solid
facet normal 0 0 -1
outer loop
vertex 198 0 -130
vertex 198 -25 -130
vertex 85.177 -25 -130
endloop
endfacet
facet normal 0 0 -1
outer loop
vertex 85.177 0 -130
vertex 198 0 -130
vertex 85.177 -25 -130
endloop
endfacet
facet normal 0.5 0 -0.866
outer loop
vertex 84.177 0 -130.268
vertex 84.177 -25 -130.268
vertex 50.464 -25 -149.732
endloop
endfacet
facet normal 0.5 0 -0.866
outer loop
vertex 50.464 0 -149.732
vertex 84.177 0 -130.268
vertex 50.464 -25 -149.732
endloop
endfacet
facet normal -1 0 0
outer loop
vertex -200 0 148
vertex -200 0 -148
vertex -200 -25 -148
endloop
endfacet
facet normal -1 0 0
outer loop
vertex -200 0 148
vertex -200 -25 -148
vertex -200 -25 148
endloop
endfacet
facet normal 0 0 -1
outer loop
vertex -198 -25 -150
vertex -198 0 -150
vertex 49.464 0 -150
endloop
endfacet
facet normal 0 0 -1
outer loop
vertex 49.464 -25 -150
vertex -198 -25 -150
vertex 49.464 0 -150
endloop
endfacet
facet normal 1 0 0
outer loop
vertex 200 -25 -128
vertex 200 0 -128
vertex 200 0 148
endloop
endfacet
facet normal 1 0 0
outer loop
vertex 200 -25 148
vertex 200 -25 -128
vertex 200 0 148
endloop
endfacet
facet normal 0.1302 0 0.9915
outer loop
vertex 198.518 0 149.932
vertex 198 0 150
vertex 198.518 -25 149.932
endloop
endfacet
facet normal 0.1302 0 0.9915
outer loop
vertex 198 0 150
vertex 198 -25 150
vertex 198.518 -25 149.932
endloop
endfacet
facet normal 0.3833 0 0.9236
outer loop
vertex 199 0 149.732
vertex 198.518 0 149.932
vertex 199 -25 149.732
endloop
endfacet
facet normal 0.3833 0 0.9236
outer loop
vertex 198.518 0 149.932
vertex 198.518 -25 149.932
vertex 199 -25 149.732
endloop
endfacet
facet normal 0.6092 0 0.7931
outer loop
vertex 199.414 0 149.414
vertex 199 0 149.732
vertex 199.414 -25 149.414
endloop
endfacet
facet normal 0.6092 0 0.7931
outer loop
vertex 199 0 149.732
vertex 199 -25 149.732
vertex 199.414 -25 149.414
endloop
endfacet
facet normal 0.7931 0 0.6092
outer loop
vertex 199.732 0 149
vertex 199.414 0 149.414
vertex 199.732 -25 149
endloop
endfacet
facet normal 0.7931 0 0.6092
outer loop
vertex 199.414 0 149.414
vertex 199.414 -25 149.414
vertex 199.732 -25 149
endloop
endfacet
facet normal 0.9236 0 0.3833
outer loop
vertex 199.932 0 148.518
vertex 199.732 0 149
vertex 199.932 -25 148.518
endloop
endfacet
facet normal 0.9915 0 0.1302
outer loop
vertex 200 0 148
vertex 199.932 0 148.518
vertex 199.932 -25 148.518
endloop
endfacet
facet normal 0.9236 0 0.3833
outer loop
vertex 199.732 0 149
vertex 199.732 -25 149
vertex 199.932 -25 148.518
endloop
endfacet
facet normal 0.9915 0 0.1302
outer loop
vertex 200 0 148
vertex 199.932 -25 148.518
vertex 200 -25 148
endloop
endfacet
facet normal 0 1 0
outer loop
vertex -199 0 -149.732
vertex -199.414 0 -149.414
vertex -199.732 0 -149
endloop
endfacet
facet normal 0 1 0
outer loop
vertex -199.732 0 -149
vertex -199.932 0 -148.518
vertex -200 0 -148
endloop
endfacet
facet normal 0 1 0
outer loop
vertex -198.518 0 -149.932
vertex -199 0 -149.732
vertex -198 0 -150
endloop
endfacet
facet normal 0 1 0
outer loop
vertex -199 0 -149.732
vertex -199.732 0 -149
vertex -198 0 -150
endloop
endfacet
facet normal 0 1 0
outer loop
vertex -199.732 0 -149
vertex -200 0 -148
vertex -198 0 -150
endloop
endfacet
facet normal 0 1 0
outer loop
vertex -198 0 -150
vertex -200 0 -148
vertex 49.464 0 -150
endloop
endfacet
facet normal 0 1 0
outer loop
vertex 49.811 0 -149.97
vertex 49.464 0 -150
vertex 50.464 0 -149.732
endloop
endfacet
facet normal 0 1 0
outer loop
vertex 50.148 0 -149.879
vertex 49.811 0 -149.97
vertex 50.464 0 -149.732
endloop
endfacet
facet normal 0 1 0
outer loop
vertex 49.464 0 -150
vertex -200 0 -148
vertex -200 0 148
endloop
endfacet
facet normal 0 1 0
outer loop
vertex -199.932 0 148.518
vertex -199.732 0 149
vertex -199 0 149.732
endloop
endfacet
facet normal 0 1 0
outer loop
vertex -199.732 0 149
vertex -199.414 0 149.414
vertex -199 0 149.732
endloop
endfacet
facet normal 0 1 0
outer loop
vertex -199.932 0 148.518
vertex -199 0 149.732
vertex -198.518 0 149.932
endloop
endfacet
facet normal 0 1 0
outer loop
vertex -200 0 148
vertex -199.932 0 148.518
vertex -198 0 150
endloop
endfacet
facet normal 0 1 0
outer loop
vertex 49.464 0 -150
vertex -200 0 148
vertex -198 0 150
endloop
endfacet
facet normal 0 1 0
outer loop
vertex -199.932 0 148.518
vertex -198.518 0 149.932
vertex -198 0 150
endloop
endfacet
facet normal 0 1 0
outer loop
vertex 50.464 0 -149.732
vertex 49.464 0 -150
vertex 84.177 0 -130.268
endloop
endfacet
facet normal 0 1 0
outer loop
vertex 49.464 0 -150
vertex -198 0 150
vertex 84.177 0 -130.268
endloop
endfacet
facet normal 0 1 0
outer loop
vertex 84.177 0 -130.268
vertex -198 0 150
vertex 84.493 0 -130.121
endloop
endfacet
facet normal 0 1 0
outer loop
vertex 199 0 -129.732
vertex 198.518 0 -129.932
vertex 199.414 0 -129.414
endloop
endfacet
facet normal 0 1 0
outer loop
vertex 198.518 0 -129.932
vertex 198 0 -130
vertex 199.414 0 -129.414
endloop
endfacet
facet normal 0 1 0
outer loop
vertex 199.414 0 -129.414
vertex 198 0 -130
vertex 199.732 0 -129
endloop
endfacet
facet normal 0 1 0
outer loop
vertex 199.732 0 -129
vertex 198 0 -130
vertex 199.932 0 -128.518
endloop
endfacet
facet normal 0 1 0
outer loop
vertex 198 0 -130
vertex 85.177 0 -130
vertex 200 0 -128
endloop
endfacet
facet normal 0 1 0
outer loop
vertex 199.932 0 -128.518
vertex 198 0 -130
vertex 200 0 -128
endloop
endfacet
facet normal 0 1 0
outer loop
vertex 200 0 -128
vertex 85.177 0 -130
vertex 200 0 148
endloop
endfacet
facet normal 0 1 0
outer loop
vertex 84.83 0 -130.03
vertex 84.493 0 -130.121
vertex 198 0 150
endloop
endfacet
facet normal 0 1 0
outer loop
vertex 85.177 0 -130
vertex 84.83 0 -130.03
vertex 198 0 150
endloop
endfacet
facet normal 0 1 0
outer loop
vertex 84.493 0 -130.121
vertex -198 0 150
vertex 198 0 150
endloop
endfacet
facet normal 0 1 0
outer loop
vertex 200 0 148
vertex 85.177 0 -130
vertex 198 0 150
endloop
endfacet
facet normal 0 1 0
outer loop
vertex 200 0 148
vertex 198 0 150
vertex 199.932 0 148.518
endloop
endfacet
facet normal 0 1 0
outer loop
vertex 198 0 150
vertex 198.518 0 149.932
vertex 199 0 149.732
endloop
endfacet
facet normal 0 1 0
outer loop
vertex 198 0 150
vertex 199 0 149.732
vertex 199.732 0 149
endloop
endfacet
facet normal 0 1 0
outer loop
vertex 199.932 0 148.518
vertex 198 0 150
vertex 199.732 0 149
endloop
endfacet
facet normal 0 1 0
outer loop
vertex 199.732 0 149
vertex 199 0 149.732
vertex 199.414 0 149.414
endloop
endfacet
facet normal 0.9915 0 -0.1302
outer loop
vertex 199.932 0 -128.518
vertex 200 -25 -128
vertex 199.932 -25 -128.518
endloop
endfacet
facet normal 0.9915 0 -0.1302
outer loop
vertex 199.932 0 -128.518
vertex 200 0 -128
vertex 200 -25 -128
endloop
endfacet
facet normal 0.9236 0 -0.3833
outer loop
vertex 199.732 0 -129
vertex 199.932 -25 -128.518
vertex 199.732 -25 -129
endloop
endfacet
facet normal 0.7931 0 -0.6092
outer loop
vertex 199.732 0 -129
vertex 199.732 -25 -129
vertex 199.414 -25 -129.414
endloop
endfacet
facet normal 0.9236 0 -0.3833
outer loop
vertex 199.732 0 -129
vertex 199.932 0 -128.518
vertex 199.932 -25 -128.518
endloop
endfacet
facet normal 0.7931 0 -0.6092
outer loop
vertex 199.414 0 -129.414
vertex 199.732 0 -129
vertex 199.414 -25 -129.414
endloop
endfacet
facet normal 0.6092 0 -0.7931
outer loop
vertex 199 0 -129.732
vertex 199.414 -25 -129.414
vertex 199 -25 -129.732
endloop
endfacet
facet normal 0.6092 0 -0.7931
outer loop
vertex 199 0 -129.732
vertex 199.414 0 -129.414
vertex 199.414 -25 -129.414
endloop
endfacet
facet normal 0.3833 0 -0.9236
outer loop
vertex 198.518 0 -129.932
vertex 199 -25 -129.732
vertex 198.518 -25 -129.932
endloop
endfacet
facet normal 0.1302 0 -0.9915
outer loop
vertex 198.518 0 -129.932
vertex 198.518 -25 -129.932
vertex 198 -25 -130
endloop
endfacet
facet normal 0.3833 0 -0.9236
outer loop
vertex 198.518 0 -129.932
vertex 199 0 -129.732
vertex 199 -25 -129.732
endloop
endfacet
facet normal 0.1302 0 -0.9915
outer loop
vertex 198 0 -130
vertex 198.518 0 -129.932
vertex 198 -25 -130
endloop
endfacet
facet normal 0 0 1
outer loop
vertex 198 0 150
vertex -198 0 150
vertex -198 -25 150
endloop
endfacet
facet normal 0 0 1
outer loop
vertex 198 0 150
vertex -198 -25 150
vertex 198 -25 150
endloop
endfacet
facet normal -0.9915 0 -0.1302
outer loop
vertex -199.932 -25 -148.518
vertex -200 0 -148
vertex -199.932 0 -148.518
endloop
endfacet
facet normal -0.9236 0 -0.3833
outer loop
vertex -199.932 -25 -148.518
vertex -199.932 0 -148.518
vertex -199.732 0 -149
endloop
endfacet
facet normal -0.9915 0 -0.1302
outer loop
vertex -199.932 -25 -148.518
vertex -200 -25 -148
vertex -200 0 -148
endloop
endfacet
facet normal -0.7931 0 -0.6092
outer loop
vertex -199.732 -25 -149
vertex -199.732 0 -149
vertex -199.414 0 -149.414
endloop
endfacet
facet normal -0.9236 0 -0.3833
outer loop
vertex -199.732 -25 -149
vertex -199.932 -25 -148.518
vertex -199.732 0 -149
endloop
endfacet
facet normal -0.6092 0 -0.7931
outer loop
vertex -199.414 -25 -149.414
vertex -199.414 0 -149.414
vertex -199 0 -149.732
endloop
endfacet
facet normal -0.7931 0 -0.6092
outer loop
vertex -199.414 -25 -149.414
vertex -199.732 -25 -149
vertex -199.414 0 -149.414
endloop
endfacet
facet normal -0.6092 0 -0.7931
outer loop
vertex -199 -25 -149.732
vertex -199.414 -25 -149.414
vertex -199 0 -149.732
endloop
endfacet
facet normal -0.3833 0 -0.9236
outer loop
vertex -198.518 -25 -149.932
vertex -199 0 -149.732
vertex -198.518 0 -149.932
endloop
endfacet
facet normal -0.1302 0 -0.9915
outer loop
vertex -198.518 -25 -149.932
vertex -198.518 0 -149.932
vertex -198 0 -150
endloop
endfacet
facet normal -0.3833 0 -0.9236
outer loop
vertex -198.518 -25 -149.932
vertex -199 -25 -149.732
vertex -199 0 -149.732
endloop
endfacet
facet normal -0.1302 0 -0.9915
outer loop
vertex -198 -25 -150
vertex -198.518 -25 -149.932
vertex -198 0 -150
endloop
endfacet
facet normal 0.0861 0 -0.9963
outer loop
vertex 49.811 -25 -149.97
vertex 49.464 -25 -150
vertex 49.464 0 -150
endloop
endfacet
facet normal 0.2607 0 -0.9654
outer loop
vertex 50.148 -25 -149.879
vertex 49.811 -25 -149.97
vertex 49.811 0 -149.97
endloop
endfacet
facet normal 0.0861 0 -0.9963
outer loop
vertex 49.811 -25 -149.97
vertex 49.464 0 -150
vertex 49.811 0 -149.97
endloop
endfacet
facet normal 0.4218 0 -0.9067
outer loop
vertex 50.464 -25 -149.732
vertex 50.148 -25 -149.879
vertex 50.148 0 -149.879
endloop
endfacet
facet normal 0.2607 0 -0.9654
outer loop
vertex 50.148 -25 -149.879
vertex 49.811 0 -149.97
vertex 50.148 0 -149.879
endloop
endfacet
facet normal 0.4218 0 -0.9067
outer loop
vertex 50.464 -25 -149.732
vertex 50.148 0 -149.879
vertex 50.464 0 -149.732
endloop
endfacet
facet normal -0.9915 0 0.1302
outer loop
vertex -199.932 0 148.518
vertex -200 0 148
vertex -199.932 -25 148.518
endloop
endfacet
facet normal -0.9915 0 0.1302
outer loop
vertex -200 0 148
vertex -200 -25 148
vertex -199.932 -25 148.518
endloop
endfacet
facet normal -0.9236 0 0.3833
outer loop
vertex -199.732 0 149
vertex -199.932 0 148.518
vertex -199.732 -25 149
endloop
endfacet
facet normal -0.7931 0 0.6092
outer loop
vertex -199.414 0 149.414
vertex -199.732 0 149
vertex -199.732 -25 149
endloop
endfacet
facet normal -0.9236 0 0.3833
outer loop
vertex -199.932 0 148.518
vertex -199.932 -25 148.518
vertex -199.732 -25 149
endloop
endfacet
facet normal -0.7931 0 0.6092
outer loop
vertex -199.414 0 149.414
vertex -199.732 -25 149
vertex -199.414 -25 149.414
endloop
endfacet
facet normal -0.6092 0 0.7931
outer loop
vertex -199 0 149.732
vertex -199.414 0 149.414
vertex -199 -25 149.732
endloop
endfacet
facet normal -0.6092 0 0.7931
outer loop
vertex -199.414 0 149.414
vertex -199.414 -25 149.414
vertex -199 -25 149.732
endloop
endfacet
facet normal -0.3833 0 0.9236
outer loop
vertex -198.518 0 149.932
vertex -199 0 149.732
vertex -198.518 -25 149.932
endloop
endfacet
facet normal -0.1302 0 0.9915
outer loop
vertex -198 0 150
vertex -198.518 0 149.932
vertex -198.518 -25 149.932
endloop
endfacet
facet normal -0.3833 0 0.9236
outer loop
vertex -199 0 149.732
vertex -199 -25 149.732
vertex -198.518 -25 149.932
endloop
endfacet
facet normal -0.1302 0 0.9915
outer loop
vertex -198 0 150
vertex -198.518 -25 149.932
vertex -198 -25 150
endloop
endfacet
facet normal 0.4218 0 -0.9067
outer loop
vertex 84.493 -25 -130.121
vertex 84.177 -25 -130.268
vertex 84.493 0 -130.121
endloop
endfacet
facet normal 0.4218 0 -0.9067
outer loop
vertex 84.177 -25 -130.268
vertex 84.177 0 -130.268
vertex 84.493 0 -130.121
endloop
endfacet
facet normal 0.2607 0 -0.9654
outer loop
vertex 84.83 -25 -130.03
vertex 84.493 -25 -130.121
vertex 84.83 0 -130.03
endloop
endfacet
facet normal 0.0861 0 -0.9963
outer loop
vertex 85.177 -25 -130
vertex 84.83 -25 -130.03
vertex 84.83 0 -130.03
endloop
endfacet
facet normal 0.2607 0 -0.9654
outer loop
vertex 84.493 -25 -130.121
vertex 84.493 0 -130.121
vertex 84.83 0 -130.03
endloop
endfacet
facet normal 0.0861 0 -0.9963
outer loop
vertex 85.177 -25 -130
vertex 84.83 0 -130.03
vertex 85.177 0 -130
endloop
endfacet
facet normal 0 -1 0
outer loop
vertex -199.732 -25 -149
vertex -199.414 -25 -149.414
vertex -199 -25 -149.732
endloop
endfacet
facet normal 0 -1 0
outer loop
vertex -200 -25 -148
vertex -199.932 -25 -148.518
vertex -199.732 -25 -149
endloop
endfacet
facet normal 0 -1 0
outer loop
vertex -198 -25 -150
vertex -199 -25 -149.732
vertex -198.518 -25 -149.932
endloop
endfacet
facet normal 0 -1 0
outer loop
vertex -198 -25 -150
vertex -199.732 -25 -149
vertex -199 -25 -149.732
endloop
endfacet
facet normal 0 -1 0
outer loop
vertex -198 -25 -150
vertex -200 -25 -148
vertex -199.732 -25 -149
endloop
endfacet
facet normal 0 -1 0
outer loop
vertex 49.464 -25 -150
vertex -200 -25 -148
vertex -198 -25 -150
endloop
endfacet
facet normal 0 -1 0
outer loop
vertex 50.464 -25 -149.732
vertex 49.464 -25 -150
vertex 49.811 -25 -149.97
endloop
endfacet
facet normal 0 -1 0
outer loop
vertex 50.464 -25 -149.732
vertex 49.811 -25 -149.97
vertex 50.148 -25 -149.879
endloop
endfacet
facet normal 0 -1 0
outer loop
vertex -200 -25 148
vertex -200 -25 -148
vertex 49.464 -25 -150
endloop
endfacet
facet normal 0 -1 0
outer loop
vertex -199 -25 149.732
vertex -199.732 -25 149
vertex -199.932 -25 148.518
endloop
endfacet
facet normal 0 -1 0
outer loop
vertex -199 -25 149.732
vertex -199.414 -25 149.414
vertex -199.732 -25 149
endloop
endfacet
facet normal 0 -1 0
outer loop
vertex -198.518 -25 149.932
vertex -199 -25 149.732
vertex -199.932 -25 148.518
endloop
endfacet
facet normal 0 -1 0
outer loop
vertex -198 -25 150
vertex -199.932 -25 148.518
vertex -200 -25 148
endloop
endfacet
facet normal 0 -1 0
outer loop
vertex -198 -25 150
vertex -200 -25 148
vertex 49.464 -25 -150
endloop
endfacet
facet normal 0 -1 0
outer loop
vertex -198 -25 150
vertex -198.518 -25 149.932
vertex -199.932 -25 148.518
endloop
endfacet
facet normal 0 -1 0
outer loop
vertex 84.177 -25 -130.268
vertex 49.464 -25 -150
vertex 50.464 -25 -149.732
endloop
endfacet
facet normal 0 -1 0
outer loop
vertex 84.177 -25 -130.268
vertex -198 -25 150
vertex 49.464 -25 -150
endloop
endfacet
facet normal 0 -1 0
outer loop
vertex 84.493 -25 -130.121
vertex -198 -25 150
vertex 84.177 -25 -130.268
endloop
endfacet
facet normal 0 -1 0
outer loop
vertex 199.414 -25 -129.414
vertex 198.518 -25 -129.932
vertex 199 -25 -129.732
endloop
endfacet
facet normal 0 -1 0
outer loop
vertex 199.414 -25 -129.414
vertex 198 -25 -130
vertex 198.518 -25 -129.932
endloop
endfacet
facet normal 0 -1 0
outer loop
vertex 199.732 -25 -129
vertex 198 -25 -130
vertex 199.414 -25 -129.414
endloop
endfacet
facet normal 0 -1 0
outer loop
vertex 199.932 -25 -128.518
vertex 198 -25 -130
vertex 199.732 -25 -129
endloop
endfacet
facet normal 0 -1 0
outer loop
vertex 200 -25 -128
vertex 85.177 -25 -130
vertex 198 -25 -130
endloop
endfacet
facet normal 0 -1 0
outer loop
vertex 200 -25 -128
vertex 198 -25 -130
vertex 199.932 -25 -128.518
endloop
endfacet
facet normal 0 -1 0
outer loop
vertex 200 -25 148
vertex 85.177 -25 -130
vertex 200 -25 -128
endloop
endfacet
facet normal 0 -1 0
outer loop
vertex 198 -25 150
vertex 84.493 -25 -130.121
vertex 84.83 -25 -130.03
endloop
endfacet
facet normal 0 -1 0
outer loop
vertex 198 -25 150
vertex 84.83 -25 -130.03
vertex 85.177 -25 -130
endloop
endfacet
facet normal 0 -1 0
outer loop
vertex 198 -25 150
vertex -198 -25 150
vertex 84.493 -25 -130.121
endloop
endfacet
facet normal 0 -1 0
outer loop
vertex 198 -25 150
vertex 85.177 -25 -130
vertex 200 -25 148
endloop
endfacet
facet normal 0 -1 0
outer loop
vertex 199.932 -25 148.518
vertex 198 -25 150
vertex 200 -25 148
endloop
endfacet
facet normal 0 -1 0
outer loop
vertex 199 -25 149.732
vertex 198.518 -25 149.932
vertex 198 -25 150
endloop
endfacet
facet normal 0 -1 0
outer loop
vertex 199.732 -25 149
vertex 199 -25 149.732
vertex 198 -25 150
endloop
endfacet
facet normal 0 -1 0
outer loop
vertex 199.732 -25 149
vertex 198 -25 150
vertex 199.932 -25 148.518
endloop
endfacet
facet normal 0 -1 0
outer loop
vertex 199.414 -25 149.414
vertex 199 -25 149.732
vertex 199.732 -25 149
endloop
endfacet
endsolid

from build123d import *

# Parameters (mm, degrees)
F0_W     = 400
F0_H     = 300
F1_DEPTH = 25
F3_DEPTH = 25.001
F4_R     = 2


with BuildPart() as f1:
    # F0 (on Front) → F1 (new body)
    with BuildSketch(Plane.XZ):
        Rectangle(F0_W, F0_H)
    extrude(amount=F1_DEPTH)

    # F2 (on face) → F3 (cut, through all)
    with BuildSketch(Plane.XZ.offset(25)):
        Polygon((84.6410161514, -130), (50, -150), (200, -150), (200, -130), align=None)
    extrude(amount=-F3_DEPTH, mode=Mode.SUBTRACT)

    # F4
    f4_edges = [f1.edges().sort_by_distance(p)[0] for p in [
        (200, -12.5, 150),
        (200, -12.5, -130),
        (-200, -12.5, -150),
        (-200, -12.5, 150),
        (50, -12.5, -150),
        (84.641016, -12.5, -130),
    ]]
    fillet(f4_edges, radius=F4_R)


solid = f1.part
